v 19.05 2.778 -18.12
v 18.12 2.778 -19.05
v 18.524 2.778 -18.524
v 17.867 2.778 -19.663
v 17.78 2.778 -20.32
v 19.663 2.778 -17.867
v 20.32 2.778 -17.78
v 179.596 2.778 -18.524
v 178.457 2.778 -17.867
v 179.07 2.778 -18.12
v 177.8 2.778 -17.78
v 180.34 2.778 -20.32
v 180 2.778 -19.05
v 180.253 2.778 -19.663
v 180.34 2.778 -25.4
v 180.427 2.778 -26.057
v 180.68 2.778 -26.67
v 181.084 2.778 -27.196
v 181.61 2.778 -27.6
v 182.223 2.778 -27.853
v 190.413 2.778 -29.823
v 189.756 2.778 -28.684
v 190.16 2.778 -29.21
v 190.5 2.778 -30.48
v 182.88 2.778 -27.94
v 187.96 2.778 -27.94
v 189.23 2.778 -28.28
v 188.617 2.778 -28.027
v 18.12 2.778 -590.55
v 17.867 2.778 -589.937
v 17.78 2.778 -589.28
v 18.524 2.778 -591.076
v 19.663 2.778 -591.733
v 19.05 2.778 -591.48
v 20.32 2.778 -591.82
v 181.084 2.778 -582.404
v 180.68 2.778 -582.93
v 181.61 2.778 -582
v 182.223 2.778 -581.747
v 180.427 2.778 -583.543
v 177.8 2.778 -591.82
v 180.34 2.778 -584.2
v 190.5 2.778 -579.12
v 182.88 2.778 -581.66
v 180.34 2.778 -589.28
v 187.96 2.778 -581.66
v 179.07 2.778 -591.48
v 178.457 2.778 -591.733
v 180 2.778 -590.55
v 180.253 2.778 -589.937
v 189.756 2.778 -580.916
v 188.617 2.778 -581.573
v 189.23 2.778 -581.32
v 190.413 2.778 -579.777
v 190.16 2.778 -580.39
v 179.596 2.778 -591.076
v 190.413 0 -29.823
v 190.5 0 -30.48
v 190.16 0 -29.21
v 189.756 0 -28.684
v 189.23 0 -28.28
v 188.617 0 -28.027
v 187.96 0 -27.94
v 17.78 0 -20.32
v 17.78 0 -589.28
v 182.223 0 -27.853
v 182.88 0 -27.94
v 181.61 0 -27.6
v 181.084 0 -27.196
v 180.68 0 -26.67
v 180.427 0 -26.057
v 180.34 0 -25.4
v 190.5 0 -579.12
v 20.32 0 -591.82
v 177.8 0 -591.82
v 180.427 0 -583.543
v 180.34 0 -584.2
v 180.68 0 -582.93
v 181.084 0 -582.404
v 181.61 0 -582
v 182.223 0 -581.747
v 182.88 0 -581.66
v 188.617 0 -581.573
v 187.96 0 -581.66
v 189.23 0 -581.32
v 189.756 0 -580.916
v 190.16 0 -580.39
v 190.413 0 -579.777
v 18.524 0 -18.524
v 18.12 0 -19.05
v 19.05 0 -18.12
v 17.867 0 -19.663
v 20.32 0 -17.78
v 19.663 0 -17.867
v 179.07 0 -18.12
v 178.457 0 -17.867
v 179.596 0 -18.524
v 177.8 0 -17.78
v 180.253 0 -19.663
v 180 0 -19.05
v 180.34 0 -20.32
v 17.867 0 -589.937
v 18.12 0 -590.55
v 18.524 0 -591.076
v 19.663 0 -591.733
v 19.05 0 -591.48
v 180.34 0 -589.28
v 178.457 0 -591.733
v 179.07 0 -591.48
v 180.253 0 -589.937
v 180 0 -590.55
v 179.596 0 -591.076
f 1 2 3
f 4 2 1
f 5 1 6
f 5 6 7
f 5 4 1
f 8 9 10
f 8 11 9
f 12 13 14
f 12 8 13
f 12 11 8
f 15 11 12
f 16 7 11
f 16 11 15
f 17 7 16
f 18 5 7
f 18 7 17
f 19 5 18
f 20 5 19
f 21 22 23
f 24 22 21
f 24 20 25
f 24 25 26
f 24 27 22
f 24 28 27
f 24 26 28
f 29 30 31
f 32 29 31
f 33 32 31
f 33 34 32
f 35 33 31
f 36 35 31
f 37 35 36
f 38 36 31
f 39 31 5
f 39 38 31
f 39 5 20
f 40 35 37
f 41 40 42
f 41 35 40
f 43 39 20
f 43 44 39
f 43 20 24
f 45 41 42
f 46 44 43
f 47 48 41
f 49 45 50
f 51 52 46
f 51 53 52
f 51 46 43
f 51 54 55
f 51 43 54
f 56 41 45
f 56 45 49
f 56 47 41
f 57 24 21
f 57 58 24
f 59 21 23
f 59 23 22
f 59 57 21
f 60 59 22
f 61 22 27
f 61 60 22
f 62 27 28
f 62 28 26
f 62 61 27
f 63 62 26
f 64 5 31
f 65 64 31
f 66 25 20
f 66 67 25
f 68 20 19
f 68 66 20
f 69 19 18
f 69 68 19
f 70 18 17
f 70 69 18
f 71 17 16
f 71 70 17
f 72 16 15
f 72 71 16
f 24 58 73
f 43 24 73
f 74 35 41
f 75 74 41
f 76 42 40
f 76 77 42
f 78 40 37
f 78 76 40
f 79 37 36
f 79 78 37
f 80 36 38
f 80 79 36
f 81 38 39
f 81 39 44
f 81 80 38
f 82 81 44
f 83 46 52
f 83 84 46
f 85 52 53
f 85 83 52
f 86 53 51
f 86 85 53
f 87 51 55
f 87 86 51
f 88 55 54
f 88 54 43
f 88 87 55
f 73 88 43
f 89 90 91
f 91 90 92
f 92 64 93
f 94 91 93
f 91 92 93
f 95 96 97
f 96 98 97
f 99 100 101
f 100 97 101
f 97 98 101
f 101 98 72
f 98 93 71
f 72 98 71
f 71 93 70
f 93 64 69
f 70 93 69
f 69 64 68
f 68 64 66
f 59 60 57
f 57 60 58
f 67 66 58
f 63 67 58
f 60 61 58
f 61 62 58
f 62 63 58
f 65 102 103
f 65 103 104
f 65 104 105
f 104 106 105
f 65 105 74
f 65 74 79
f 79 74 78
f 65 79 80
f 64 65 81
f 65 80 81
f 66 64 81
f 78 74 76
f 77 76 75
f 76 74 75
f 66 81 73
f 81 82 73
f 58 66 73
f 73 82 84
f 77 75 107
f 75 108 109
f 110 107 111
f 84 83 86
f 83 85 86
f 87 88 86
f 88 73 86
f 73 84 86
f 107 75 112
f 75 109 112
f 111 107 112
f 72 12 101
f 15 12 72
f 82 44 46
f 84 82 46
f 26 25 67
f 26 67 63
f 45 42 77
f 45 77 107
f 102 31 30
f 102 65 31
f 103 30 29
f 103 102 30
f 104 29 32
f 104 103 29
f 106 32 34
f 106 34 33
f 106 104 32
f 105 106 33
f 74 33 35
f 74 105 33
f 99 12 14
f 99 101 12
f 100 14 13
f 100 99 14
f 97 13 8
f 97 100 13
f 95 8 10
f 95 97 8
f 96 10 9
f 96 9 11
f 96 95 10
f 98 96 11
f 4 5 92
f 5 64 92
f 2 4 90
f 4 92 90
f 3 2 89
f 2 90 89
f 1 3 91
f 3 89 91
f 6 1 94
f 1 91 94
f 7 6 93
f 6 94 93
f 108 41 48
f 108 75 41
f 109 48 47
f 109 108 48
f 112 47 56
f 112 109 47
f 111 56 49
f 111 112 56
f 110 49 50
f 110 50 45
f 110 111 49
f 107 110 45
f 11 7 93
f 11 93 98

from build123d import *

# Parameters (mm, degrees)
SKETCH1_W           = 190.5
SKETCH1_H           = 609.6
BOSS_EXTRUDE1_DEPTH = 2.778125
SKETCH2_W           = 190.5
SKETCH2_H           = 17.78
CUT_EXTRUDE1_DEPTH  = 3.778125
SKETCH3_W           = 17.78
SKETCH3_H           = 574.04
CUT_EXTRUDE2_DEPTH  = 3.778125
SKETCH4_W           = 10.16
SKETCH4_H           = 10.16
CUT_EXTRUDE3_DEPTH  = 3.778125
FILLET1_R           = 2.54


with BuildPart() as part:
    # Sketch1 → Boss-Extrude1 (new body)
    with BuildSketch(Plane(origin=(0, 0, 0), x_dir=(1, 0, 0), z_dir=(0, 1, 0))):
        with Locations((95.25, 304.8)):
            Rectangle(SKETCH1_W, SKETCH1_H)
    extrude(amount=BOSS_EXTRUDE1_DEPTH)

    # Sketch2 → Cut-Extrude1 (cut, through all)
    with BuildSketch(Plane(origin=(0, 2.778125, 0), x_dir=(1, 0, 0), z_dir=(0, 1, 0))):
        with Locations((95.25, 8.89)):
            Rectangle(SKETCH2_W, SKETCH2_H)
        with Locations((95.25, 600.71)):
            Rectangle(SKETCH2_W, SKETCH2_H)
    extrude(amount=-CUT_EXTRUDE1_DEPTH, mode=Mode.SUBTRACT)

    # Sketch3 → Cut-Extrude2 (cut, through all)
    with BuildSketch(Plane(origin=(0, 2.778125, 0), x_dir=(1, 0, 0), z_dir=(0, 1, 0))):
        with Locations((8.89, 304.8)):
            Rectangle(SKETCH3_W, SKETCH3_H)
    extrude(amount=-CUT_EXTRUDE2_DEPTH, mode=Mode.SUBTRACT)

    # Sketch4 → Cut-Extrude3 (cut, through all)
    with BuildSketch(Plane(origin=(0, 2.778125, 0), x_dir=(1, 0, 0), z_dir=(0, 1, 0))):
        with Locations((185.42, 586.74)):
            Rectangle(SKETCH4_W, SKETCH4_H)
        with Locations((185.42, 22.86)):
            Rectangle(SKETCH4_W, SKETCH4_H)
    extrude(amount=-CUT_EXTRUDE3_DEPTH, mode=Mode.SUBTRACT)

    # Fillet1
    fillet1_edges = [part.edges().sort_by_distance(p)[0] for p in [
        (17.78, 1.3890625, -591.82),
        (17.78, 1.3890625, -17.78),
        (190.5, 1.3890625, -581.66),
        (180.34, 1.3890625, -581.66),
        (180.34, 1.3890625, -591.82),
        (190.5, 1.3890625, -27.94),
        (180.34, 1.3890625, -17.78),
        (180.34, 1.3890625, -27.94),
    ]]
    fillet(fillet1_edges, radius=FILLET1_R)


solid = part.part
